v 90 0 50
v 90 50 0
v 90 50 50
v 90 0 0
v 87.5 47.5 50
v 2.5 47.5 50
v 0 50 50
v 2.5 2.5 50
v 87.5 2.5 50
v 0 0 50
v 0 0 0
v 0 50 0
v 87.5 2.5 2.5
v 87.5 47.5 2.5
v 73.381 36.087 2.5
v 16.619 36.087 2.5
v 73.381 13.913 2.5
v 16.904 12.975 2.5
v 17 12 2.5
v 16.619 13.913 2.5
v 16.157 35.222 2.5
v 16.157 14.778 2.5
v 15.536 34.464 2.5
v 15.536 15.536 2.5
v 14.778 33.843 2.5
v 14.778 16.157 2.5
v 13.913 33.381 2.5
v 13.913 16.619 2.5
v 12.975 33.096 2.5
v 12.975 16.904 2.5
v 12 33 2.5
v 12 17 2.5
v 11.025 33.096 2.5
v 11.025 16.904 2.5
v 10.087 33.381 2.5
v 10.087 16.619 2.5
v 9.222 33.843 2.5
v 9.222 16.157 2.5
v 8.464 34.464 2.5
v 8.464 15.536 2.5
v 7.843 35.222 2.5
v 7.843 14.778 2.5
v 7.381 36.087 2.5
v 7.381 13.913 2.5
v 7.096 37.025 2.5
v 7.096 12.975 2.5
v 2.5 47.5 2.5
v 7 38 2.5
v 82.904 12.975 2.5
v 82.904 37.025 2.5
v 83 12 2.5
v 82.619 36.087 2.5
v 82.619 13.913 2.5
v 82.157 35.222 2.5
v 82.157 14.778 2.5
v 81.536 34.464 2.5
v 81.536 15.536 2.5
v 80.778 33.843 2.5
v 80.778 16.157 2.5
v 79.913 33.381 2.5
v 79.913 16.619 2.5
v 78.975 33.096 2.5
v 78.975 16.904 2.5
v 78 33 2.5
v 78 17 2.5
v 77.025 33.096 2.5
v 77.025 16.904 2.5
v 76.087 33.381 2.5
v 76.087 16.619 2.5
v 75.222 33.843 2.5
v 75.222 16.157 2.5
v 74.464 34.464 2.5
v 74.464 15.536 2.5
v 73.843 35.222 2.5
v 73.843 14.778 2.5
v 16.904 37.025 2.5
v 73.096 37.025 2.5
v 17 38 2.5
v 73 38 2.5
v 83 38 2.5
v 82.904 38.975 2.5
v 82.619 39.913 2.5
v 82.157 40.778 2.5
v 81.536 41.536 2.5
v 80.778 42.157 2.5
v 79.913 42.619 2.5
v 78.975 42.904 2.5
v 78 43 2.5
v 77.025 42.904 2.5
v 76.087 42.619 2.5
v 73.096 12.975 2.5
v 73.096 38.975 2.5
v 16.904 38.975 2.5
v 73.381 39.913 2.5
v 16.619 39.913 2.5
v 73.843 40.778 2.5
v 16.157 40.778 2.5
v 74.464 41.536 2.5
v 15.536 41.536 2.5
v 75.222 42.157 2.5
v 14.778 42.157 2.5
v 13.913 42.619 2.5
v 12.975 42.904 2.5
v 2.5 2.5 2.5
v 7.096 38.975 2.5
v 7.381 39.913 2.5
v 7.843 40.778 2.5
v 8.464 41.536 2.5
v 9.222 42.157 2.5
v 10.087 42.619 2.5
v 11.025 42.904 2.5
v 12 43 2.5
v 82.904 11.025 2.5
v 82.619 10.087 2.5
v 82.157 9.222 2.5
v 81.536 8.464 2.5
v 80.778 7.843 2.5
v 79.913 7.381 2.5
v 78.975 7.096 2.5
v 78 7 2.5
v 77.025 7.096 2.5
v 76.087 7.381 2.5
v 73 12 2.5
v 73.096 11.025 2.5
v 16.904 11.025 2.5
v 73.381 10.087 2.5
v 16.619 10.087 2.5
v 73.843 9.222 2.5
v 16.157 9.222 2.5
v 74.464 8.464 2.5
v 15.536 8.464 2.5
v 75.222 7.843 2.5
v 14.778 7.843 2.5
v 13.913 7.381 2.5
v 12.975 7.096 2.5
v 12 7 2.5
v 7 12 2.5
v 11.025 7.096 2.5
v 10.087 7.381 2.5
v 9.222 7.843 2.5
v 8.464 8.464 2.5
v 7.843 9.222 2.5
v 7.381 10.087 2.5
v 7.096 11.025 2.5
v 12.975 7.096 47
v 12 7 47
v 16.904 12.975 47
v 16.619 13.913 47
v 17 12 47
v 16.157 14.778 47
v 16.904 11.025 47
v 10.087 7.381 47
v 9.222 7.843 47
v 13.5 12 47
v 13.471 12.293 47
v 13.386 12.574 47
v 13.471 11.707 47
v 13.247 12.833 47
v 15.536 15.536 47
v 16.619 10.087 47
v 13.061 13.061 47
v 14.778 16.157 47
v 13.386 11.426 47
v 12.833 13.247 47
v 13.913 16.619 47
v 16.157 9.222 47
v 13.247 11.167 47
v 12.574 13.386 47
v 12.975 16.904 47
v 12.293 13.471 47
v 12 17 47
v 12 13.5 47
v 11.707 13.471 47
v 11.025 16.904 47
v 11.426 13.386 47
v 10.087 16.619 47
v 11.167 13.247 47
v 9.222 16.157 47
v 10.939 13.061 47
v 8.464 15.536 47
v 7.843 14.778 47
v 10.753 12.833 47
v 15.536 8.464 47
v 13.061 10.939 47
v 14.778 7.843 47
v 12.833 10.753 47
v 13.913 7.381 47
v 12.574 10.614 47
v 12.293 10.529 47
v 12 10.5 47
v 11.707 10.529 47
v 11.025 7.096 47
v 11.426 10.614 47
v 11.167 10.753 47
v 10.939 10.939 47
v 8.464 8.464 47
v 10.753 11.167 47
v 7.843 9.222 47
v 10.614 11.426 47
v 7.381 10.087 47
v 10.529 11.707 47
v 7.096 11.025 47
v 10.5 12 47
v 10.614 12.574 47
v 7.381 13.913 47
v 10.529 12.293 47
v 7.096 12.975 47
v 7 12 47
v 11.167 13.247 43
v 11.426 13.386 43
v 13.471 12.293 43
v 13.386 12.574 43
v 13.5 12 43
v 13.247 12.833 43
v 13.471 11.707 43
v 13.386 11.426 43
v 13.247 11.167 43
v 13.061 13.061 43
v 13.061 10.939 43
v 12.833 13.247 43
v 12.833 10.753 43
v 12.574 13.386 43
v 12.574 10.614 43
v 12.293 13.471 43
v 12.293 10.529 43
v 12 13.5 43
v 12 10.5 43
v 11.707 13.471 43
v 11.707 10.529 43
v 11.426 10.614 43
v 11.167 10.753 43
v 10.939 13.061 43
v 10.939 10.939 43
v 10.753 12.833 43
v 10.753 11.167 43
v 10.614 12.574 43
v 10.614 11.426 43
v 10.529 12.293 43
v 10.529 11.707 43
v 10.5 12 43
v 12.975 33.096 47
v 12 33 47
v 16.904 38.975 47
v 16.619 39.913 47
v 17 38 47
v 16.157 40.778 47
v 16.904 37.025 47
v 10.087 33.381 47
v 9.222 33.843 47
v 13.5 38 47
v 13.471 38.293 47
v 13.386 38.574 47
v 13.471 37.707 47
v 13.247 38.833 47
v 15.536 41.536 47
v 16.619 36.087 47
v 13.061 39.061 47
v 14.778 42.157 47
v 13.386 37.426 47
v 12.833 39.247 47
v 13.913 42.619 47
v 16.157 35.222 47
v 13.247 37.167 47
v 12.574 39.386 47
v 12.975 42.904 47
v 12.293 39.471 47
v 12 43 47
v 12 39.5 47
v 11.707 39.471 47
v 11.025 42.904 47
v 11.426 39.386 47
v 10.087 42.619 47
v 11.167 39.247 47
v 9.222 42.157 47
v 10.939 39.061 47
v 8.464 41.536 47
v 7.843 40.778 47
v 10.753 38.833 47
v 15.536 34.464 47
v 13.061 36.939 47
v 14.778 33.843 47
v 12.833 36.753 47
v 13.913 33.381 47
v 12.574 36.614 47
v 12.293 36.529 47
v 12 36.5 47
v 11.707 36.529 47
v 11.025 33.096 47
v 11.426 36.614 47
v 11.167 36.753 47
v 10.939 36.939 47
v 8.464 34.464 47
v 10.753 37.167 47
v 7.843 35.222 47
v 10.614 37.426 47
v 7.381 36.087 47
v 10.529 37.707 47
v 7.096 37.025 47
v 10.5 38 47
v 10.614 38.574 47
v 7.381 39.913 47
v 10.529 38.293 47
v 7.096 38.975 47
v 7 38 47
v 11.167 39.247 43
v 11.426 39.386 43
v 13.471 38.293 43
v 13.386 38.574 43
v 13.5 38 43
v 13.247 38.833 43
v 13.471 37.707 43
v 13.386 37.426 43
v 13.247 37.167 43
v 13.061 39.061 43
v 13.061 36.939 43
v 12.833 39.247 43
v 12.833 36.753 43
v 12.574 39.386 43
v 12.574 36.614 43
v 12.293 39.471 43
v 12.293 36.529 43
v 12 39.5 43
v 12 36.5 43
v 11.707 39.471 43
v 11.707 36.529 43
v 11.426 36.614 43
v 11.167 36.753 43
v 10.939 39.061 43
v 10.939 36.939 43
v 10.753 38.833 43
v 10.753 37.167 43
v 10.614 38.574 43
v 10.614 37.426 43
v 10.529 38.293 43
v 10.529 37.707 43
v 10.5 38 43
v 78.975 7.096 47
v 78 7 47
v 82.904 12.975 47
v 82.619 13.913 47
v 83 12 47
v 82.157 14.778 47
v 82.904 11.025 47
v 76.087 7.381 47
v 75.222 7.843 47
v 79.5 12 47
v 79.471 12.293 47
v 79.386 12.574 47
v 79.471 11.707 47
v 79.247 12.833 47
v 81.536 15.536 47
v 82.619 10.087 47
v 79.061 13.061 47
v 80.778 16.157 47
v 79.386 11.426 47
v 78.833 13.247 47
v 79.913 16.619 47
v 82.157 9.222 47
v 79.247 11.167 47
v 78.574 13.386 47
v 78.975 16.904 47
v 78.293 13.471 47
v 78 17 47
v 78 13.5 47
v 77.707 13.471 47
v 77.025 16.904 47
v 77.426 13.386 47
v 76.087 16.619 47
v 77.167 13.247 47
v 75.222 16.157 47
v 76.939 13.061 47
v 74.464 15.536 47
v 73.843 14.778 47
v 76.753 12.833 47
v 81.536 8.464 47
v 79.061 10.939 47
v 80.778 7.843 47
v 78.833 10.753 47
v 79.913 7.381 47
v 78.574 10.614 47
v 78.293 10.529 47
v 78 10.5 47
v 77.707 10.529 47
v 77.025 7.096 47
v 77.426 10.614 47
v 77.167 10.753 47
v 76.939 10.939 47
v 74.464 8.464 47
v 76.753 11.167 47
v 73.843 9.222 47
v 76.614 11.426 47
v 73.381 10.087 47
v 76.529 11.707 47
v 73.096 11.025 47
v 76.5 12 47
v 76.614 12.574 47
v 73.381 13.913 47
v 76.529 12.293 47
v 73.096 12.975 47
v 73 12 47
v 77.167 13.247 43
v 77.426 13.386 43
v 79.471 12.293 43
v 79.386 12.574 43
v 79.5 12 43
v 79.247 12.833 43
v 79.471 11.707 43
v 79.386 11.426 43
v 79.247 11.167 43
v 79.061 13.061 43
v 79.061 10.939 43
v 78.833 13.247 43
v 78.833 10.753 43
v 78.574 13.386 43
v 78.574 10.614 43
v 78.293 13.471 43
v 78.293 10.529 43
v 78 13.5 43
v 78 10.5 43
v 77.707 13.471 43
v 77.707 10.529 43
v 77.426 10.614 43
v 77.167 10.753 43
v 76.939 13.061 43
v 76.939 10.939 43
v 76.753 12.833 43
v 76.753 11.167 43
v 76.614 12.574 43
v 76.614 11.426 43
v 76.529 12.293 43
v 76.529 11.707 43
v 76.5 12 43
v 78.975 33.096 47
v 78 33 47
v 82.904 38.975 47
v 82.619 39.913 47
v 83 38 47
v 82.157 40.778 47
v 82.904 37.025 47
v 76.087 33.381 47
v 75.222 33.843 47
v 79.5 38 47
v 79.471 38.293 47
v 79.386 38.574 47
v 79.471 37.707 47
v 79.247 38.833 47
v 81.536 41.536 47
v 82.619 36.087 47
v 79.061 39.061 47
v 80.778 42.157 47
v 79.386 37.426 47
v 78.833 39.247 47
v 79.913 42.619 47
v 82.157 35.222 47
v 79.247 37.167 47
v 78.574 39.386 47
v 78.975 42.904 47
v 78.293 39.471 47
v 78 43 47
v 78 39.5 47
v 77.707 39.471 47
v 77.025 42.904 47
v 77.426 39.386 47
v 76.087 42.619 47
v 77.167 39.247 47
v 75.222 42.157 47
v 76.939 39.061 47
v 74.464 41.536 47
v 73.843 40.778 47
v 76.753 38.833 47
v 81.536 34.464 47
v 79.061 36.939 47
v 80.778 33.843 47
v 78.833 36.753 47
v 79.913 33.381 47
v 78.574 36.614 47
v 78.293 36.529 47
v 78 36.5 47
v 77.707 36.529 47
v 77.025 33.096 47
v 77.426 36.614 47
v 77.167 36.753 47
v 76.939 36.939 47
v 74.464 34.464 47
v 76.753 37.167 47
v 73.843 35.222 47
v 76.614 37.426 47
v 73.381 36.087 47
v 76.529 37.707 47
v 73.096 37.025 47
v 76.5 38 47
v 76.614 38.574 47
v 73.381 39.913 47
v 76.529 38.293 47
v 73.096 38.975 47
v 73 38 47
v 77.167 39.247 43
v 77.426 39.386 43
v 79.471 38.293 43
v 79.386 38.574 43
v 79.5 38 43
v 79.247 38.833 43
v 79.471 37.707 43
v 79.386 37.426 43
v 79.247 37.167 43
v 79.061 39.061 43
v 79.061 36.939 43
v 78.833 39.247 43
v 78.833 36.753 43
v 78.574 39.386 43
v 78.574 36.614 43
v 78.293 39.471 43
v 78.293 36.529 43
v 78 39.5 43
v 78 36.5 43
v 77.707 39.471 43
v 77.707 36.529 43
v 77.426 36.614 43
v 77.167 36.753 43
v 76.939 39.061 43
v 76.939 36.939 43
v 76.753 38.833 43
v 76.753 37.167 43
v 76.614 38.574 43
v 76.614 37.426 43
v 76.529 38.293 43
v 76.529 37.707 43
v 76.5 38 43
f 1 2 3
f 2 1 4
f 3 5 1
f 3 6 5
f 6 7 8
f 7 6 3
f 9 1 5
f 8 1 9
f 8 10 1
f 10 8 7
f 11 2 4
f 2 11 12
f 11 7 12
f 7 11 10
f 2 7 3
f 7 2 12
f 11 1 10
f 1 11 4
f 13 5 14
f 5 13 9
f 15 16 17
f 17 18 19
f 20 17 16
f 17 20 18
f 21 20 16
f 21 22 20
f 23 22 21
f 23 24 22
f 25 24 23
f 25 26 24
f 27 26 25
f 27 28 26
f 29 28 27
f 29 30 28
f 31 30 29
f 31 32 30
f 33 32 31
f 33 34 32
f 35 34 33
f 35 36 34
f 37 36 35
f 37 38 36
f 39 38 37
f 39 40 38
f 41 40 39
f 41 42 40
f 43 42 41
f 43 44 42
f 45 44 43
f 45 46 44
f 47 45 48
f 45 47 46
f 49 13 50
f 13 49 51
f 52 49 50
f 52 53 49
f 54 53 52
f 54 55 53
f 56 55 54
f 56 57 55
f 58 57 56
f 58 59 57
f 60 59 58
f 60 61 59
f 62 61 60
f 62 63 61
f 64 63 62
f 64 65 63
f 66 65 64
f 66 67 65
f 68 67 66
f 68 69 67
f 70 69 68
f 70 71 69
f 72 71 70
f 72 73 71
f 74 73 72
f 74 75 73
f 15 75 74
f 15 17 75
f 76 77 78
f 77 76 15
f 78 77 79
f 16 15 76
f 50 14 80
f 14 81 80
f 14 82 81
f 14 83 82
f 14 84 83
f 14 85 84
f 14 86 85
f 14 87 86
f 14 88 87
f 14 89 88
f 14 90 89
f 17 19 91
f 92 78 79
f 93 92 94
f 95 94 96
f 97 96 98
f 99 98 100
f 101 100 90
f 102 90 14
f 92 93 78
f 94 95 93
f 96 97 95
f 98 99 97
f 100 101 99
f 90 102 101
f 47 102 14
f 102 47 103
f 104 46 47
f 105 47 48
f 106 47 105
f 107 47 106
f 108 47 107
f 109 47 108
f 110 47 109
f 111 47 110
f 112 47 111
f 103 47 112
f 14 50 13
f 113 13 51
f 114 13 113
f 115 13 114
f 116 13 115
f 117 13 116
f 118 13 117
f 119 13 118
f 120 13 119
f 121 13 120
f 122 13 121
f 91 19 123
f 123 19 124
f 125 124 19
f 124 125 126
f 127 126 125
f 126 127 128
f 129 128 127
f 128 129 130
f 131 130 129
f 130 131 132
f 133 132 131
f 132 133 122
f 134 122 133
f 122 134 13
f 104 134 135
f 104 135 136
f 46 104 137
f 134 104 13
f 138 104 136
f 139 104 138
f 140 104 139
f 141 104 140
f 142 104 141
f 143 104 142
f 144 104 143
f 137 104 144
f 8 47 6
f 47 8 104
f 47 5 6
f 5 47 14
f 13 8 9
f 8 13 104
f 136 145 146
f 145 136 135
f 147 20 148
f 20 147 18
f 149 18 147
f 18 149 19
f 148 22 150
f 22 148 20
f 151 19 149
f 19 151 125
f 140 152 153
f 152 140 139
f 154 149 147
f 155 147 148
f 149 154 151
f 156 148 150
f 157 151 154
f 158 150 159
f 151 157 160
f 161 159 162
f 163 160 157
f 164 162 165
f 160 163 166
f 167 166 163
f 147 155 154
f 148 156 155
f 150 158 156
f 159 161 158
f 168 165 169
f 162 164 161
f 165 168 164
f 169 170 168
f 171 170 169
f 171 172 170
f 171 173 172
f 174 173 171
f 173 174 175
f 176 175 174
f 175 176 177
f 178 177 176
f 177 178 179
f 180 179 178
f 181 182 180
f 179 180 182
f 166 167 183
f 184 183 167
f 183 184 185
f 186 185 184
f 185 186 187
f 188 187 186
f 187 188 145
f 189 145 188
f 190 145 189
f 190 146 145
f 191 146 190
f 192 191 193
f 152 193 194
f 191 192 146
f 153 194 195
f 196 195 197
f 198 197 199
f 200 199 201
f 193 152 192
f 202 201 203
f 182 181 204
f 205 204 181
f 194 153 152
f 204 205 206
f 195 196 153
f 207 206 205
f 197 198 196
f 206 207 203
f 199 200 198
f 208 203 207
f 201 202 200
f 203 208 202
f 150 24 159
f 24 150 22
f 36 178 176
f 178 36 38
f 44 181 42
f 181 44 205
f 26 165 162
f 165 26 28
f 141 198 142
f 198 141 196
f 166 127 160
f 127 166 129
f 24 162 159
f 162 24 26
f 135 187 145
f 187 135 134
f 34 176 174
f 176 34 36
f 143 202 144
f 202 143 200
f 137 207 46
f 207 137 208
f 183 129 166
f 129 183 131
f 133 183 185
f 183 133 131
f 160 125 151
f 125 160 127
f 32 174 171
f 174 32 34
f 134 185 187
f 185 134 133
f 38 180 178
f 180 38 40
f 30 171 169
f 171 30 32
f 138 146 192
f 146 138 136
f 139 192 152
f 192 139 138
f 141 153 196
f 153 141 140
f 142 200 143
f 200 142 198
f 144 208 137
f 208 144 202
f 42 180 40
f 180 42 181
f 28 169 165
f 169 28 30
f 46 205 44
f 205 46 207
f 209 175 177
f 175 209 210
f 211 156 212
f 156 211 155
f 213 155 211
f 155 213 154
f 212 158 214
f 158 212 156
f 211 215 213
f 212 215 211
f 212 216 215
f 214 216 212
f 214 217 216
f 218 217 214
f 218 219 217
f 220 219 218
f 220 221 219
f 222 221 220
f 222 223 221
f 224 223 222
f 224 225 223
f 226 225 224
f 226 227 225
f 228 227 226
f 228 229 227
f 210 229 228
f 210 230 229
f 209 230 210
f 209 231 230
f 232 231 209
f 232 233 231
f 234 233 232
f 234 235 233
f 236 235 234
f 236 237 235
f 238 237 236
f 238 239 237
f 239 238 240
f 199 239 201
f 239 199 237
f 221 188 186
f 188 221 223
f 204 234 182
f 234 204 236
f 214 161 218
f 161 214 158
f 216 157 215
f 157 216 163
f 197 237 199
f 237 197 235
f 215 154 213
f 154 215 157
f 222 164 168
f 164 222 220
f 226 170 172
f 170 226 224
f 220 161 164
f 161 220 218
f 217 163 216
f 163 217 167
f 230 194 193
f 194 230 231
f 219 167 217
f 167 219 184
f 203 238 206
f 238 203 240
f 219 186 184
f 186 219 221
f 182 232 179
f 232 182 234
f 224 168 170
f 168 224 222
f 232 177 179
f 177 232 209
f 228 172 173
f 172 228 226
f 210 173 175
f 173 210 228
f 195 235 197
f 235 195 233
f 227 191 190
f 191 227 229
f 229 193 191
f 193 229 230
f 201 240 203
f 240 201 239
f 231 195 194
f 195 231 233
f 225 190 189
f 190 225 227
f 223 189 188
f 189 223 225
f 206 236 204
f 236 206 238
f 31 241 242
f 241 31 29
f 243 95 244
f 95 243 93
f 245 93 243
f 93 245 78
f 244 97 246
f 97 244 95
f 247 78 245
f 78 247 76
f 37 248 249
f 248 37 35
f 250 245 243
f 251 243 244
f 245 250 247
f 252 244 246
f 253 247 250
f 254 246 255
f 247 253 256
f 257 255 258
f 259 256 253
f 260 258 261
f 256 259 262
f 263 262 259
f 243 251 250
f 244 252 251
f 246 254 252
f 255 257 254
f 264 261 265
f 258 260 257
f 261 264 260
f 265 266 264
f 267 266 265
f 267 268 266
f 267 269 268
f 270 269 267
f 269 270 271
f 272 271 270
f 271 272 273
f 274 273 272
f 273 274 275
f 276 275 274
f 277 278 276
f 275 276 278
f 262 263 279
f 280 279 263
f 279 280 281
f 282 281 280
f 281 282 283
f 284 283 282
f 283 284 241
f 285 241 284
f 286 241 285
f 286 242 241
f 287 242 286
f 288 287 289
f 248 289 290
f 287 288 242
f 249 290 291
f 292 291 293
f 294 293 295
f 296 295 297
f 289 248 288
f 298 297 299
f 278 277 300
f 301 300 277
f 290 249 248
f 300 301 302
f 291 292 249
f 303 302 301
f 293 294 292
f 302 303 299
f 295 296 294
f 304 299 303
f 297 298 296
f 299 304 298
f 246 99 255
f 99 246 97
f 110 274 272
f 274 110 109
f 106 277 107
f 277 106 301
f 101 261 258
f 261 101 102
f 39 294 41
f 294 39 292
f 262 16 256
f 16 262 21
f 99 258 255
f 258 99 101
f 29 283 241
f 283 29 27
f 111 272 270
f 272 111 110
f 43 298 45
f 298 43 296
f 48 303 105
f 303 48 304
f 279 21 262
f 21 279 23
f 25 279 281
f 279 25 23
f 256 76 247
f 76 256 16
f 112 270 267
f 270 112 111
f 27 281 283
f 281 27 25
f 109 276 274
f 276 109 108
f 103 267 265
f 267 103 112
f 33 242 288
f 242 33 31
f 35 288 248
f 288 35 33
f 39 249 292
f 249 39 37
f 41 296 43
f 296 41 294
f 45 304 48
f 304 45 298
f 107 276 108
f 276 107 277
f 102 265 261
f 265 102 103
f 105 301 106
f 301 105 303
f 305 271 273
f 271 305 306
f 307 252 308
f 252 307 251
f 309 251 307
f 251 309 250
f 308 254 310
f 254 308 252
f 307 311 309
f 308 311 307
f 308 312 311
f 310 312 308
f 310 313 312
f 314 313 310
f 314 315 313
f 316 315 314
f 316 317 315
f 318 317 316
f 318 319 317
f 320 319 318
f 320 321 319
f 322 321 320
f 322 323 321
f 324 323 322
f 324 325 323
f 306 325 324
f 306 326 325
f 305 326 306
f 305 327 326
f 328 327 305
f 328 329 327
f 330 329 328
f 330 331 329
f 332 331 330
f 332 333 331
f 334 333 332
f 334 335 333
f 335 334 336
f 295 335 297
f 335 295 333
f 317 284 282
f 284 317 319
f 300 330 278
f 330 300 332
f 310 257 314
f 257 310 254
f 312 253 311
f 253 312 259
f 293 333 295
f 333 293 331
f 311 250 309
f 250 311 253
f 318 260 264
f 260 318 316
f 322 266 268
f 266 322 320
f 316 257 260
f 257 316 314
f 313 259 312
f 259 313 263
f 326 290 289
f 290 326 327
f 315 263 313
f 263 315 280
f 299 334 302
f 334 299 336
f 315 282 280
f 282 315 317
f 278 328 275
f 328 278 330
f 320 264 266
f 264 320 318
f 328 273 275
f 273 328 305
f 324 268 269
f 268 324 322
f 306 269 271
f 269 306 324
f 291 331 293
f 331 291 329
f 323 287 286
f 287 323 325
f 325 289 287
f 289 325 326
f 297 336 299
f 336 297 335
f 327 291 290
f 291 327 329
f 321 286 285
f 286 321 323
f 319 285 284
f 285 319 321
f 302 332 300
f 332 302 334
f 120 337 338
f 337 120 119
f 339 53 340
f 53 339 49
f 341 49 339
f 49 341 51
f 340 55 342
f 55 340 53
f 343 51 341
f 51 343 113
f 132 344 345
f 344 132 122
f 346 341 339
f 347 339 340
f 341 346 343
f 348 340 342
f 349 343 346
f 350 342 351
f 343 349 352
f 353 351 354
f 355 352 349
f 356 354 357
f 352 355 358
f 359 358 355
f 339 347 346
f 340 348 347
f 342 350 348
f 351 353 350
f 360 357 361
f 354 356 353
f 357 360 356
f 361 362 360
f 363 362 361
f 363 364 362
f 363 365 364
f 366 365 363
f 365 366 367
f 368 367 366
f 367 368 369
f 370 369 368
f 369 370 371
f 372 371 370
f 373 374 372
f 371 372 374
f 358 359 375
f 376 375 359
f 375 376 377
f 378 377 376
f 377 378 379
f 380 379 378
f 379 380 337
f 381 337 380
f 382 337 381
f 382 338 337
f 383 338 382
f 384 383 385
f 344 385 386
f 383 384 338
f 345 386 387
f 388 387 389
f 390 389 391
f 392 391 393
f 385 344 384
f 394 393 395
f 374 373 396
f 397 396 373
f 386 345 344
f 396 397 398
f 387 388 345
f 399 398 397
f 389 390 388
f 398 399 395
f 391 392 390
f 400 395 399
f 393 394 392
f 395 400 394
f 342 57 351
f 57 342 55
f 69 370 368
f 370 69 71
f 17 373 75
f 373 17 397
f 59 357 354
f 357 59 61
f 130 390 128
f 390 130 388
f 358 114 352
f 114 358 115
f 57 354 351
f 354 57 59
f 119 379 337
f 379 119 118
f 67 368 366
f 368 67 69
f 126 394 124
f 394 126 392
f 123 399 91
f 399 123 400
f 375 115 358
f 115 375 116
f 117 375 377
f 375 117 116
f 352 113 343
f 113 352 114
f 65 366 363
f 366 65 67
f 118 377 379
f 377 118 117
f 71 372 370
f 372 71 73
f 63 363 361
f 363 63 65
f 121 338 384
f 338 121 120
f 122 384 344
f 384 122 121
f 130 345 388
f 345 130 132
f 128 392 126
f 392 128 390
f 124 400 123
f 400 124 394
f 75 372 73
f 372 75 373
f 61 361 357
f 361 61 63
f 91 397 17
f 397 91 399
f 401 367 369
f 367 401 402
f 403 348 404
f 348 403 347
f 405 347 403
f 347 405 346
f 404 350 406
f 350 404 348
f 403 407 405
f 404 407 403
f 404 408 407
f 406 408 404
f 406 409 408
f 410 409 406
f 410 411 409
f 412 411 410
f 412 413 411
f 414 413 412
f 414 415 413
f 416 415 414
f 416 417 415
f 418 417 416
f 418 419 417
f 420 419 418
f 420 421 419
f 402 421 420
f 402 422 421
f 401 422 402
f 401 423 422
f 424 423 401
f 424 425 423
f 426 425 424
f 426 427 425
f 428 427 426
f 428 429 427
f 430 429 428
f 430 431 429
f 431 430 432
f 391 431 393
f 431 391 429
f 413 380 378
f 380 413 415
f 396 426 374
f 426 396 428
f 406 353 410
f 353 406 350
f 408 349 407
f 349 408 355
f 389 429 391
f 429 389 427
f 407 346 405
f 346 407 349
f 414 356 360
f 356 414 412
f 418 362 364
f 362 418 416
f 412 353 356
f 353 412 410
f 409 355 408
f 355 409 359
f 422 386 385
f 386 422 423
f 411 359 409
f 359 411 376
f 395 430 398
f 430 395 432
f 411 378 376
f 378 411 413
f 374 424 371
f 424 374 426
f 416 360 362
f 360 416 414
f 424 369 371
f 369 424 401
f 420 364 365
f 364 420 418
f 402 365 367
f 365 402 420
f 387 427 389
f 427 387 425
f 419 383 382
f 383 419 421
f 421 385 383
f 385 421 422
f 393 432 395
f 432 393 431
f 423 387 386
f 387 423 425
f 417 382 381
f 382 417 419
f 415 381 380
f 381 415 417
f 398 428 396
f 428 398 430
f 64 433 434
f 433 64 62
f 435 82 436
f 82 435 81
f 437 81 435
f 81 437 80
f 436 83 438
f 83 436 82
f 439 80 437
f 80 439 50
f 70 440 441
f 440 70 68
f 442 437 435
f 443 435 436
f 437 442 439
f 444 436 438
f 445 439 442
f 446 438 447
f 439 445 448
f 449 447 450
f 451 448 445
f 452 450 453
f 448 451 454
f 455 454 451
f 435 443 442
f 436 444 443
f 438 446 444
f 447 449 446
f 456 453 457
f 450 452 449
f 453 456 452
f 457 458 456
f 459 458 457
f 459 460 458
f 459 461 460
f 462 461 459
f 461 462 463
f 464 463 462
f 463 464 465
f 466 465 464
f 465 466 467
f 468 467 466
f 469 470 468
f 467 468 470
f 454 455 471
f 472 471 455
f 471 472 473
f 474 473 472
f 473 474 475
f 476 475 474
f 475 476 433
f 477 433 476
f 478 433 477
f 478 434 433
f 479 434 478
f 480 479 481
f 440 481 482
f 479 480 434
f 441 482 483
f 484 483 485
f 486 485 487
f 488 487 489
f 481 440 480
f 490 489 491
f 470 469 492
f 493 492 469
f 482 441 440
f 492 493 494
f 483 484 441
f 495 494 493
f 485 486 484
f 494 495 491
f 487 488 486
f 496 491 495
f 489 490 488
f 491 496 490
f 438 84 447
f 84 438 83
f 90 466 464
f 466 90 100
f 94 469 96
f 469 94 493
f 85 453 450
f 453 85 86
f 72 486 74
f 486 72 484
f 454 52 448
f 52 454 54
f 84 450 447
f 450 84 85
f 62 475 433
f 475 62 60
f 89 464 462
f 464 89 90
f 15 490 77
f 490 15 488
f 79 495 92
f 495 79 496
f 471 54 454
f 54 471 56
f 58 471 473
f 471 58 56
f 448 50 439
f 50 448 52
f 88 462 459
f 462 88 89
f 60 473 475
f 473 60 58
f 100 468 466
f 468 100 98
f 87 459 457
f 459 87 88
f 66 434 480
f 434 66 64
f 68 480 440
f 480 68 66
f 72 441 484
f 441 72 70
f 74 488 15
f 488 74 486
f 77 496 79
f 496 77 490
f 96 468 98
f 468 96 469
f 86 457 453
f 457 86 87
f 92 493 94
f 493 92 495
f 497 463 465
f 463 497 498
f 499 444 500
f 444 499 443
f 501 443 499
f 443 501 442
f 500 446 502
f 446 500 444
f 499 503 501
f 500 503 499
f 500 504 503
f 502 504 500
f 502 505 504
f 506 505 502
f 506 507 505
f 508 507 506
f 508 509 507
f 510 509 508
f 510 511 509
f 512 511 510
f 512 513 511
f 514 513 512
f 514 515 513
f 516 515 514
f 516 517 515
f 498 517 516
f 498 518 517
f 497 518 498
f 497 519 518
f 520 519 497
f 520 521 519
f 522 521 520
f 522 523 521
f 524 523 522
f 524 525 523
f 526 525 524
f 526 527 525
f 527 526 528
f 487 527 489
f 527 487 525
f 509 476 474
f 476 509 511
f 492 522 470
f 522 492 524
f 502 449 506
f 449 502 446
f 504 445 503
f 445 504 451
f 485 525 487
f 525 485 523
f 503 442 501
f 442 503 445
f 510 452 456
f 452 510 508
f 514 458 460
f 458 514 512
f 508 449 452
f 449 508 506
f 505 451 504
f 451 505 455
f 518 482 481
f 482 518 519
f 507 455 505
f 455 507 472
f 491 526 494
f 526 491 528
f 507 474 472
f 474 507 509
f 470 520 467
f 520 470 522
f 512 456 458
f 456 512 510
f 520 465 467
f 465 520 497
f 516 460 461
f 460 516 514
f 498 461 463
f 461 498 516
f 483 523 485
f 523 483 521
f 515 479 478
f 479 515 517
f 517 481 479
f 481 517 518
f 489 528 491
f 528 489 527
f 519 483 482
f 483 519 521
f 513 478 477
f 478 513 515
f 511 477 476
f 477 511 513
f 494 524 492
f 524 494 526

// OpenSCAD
$fn = 32;

// ----------------------------------------------------------------------
// Enclosure box: bosses enclosure
// ----------------------------------------------------------------------

// --- parameters (mm) ---
box_l = 90;               // outer length, X
box_w = 50;               // outer width, Y
box_h = 50;               // outer height
wall_t = 2.5;             // wall thickness
boss_r = 5;               // corner boss radius
hole_r = 1.5;             // boss screw hole radius
boss_in = 12;             // boss inset from the corners

inner_h = box_h - wall_t;  // cavity depth
boss_h = inner_h - 2;  // corner boss height

difference() {
  union() {
    difference() {
      cube([box_l, box_w, box_h]);
      translate([wall_t, wall_t, wall_t])
        cube([box_l - 2 * wall_t, box_w - 2 * wall_t, box_h]);
    }
    for (sx = [0, 1], sy = [0, 1])
      translate([sx ? box_l - boss_in : boss_in,
                 sy ? box_w - boss_in : boss_in, wall_t - 1])
        difference() {
          cylinder(r = boss_r, h = boss_h);
          translate([0, 0, boss_h - 4])
            cylinder(r = hole_r, h = 5);
        }
  }
}
